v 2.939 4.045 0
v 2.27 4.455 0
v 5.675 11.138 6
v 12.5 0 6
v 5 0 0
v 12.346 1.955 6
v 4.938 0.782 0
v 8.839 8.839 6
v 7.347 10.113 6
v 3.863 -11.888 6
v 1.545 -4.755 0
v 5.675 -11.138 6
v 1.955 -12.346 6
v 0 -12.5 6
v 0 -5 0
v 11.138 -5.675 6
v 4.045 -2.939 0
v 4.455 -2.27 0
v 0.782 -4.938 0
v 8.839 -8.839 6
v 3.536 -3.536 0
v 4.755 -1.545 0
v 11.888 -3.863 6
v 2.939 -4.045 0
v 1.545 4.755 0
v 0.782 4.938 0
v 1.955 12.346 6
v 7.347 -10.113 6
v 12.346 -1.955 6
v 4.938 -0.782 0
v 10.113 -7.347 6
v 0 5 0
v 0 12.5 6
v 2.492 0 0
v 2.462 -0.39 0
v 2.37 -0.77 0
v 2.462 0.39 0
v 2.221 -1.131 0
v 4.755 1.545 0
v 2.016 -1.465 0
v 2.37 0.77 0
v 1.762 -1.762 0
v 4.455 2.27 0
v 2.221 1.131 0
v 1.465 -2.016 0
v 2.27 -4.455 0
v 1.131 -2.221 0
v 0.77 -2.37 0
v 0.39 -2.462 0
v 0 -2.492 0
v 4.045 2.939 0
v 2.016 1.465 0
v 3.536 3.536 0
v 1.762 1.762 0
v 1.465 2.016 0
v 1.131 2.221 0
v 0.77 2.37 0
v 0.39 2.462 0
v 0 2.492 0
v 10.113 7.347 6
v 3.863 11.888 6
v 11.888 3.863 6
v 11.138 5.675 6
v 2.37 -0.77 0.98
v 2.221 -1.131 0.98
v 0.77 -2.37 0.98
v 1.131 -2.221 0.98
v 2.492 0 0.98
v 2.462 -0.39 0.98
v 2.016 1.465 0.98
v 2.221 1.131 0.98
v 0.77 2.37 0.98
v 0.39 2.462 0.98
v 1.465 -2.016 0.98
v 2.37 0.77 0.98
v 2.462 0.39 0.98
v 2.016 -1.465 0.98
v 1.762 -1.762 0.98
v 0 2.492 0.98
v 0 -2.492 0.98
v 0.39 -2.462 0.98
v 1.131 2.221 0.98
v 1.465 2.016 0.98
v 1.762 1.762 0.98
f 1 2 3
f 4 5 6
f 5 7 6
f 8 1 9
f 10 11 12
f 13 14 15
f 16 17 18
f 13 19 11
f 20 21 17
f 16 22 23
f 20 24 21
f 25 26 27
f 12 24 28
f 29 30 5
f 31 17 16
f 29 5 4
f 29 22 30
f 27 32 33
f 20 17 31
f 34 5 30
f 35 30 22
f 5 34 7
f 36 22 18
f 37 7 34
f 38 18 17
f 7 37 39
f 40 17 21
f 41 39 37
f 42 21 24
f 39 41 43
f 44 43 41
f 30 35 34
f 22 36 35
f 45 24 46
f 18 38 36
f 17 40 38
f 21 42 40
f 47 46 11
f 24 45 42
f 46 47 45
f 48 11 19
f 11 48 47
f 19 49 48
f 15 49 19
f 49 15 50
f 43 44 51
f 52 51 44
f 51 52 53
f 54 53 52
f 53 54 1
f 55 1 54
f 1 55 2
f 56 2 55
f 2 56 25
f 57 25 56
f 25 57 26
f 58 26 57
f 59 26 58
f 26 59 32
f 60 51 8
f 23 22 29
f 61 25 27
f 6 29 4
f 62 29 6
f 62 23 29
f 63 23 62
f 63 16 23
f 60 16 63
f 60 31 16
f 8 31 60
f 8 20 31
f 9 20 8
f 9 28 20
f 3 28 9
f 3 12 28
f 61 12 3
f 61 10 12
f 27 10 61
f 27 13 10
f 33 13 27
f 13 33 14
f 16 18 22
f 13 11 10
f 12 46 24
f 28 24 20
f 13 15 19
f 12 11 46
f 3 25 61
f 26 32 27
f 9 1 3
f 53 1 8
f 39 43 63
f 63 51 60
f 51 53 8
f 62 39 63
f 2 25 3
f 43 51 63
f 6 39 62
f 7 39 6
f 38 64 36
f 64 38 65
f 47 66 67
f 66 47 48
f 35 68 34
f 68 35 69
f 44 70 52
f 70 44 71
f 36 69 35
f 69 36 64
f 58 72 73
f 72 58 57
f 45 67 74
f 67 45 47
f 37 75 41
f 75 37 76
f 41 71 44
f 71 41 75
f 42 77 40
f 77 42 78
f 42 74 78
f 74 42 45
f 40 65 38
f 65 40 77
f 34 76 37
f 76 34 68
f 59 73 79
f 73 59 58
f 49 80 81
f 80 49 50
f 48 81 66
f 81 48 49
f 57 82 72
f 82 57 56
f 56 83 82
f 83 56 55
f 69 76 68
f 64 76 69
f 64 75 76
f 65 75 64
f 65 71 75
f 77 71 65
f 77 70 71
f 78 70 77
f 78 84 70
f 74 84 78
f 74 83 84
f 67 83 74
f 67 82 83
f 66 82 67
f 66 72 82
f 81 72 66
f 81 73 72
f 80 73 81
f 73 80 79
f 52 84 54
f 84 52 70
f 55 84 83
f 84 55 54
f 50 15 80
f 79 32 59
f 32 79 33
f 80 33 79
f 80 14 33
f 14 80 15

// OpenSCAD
/* This file provides the carve_base() module to hollow-out the base of an object
 * by a given height h, leaving out a border of r thickness.
 *
 * By default the hollowing is cylindric. Optionally, if cylindric=false, the
 * hollowing uses Minkowski with a radius of fn.
 */


module carve_base(h=1, r=2.5, world=1e5, fn=5, cylindric=true) {
    //if(1) children(); else
    if (cylindric) {
       carve_base_cylinder(h, r, world) children();
    }
    else {
       carve_base_minkowski(h, r, world, fn) children();
    }
}


ATOM      = 0.01;


module carve_base_minkowski(h=1, r=2.5, world=1e5, fn=4+1) {
    difference() {
        // original
        children();
        
        // shaved foot
        translate([0, 0, -ATOM])
        difference() {
            cylinder(r=world, h=h-ATOM);
            minkowski() {
                difference() {
                    cylinder(r=world, h=h+ATOM);
                    translate([0, 0, -ATOM])
                    intersection() {
                        children();
                        cylinder(r=world, h=h+ATOM);
                    }
                }
                cylinder(r=r, h=ATOM, $fn=fn);
            }
        }
    }
}


module carve_base_cylinder(h=1, r=2.5, world=1000) {
    difference() {
        // original
        children();
                    
        // shaved foot
        translate([0, 0, -ATOM*2])
        linear_extrude(height=h)
        offset(r=-r)
        projection(cut=true)
        children();
    }
}


intersection() {
    //carve_base_minkowski()
    carve_base(cylindric=true)
    intersection() {
        //translate([0, 0, 3]) sphere(d=10, $fn=64);
        cylinder(d1=10, d2=25, h=6, $fn=40);
    }

    translate([0, -15, -15])
    cube(30);
}
